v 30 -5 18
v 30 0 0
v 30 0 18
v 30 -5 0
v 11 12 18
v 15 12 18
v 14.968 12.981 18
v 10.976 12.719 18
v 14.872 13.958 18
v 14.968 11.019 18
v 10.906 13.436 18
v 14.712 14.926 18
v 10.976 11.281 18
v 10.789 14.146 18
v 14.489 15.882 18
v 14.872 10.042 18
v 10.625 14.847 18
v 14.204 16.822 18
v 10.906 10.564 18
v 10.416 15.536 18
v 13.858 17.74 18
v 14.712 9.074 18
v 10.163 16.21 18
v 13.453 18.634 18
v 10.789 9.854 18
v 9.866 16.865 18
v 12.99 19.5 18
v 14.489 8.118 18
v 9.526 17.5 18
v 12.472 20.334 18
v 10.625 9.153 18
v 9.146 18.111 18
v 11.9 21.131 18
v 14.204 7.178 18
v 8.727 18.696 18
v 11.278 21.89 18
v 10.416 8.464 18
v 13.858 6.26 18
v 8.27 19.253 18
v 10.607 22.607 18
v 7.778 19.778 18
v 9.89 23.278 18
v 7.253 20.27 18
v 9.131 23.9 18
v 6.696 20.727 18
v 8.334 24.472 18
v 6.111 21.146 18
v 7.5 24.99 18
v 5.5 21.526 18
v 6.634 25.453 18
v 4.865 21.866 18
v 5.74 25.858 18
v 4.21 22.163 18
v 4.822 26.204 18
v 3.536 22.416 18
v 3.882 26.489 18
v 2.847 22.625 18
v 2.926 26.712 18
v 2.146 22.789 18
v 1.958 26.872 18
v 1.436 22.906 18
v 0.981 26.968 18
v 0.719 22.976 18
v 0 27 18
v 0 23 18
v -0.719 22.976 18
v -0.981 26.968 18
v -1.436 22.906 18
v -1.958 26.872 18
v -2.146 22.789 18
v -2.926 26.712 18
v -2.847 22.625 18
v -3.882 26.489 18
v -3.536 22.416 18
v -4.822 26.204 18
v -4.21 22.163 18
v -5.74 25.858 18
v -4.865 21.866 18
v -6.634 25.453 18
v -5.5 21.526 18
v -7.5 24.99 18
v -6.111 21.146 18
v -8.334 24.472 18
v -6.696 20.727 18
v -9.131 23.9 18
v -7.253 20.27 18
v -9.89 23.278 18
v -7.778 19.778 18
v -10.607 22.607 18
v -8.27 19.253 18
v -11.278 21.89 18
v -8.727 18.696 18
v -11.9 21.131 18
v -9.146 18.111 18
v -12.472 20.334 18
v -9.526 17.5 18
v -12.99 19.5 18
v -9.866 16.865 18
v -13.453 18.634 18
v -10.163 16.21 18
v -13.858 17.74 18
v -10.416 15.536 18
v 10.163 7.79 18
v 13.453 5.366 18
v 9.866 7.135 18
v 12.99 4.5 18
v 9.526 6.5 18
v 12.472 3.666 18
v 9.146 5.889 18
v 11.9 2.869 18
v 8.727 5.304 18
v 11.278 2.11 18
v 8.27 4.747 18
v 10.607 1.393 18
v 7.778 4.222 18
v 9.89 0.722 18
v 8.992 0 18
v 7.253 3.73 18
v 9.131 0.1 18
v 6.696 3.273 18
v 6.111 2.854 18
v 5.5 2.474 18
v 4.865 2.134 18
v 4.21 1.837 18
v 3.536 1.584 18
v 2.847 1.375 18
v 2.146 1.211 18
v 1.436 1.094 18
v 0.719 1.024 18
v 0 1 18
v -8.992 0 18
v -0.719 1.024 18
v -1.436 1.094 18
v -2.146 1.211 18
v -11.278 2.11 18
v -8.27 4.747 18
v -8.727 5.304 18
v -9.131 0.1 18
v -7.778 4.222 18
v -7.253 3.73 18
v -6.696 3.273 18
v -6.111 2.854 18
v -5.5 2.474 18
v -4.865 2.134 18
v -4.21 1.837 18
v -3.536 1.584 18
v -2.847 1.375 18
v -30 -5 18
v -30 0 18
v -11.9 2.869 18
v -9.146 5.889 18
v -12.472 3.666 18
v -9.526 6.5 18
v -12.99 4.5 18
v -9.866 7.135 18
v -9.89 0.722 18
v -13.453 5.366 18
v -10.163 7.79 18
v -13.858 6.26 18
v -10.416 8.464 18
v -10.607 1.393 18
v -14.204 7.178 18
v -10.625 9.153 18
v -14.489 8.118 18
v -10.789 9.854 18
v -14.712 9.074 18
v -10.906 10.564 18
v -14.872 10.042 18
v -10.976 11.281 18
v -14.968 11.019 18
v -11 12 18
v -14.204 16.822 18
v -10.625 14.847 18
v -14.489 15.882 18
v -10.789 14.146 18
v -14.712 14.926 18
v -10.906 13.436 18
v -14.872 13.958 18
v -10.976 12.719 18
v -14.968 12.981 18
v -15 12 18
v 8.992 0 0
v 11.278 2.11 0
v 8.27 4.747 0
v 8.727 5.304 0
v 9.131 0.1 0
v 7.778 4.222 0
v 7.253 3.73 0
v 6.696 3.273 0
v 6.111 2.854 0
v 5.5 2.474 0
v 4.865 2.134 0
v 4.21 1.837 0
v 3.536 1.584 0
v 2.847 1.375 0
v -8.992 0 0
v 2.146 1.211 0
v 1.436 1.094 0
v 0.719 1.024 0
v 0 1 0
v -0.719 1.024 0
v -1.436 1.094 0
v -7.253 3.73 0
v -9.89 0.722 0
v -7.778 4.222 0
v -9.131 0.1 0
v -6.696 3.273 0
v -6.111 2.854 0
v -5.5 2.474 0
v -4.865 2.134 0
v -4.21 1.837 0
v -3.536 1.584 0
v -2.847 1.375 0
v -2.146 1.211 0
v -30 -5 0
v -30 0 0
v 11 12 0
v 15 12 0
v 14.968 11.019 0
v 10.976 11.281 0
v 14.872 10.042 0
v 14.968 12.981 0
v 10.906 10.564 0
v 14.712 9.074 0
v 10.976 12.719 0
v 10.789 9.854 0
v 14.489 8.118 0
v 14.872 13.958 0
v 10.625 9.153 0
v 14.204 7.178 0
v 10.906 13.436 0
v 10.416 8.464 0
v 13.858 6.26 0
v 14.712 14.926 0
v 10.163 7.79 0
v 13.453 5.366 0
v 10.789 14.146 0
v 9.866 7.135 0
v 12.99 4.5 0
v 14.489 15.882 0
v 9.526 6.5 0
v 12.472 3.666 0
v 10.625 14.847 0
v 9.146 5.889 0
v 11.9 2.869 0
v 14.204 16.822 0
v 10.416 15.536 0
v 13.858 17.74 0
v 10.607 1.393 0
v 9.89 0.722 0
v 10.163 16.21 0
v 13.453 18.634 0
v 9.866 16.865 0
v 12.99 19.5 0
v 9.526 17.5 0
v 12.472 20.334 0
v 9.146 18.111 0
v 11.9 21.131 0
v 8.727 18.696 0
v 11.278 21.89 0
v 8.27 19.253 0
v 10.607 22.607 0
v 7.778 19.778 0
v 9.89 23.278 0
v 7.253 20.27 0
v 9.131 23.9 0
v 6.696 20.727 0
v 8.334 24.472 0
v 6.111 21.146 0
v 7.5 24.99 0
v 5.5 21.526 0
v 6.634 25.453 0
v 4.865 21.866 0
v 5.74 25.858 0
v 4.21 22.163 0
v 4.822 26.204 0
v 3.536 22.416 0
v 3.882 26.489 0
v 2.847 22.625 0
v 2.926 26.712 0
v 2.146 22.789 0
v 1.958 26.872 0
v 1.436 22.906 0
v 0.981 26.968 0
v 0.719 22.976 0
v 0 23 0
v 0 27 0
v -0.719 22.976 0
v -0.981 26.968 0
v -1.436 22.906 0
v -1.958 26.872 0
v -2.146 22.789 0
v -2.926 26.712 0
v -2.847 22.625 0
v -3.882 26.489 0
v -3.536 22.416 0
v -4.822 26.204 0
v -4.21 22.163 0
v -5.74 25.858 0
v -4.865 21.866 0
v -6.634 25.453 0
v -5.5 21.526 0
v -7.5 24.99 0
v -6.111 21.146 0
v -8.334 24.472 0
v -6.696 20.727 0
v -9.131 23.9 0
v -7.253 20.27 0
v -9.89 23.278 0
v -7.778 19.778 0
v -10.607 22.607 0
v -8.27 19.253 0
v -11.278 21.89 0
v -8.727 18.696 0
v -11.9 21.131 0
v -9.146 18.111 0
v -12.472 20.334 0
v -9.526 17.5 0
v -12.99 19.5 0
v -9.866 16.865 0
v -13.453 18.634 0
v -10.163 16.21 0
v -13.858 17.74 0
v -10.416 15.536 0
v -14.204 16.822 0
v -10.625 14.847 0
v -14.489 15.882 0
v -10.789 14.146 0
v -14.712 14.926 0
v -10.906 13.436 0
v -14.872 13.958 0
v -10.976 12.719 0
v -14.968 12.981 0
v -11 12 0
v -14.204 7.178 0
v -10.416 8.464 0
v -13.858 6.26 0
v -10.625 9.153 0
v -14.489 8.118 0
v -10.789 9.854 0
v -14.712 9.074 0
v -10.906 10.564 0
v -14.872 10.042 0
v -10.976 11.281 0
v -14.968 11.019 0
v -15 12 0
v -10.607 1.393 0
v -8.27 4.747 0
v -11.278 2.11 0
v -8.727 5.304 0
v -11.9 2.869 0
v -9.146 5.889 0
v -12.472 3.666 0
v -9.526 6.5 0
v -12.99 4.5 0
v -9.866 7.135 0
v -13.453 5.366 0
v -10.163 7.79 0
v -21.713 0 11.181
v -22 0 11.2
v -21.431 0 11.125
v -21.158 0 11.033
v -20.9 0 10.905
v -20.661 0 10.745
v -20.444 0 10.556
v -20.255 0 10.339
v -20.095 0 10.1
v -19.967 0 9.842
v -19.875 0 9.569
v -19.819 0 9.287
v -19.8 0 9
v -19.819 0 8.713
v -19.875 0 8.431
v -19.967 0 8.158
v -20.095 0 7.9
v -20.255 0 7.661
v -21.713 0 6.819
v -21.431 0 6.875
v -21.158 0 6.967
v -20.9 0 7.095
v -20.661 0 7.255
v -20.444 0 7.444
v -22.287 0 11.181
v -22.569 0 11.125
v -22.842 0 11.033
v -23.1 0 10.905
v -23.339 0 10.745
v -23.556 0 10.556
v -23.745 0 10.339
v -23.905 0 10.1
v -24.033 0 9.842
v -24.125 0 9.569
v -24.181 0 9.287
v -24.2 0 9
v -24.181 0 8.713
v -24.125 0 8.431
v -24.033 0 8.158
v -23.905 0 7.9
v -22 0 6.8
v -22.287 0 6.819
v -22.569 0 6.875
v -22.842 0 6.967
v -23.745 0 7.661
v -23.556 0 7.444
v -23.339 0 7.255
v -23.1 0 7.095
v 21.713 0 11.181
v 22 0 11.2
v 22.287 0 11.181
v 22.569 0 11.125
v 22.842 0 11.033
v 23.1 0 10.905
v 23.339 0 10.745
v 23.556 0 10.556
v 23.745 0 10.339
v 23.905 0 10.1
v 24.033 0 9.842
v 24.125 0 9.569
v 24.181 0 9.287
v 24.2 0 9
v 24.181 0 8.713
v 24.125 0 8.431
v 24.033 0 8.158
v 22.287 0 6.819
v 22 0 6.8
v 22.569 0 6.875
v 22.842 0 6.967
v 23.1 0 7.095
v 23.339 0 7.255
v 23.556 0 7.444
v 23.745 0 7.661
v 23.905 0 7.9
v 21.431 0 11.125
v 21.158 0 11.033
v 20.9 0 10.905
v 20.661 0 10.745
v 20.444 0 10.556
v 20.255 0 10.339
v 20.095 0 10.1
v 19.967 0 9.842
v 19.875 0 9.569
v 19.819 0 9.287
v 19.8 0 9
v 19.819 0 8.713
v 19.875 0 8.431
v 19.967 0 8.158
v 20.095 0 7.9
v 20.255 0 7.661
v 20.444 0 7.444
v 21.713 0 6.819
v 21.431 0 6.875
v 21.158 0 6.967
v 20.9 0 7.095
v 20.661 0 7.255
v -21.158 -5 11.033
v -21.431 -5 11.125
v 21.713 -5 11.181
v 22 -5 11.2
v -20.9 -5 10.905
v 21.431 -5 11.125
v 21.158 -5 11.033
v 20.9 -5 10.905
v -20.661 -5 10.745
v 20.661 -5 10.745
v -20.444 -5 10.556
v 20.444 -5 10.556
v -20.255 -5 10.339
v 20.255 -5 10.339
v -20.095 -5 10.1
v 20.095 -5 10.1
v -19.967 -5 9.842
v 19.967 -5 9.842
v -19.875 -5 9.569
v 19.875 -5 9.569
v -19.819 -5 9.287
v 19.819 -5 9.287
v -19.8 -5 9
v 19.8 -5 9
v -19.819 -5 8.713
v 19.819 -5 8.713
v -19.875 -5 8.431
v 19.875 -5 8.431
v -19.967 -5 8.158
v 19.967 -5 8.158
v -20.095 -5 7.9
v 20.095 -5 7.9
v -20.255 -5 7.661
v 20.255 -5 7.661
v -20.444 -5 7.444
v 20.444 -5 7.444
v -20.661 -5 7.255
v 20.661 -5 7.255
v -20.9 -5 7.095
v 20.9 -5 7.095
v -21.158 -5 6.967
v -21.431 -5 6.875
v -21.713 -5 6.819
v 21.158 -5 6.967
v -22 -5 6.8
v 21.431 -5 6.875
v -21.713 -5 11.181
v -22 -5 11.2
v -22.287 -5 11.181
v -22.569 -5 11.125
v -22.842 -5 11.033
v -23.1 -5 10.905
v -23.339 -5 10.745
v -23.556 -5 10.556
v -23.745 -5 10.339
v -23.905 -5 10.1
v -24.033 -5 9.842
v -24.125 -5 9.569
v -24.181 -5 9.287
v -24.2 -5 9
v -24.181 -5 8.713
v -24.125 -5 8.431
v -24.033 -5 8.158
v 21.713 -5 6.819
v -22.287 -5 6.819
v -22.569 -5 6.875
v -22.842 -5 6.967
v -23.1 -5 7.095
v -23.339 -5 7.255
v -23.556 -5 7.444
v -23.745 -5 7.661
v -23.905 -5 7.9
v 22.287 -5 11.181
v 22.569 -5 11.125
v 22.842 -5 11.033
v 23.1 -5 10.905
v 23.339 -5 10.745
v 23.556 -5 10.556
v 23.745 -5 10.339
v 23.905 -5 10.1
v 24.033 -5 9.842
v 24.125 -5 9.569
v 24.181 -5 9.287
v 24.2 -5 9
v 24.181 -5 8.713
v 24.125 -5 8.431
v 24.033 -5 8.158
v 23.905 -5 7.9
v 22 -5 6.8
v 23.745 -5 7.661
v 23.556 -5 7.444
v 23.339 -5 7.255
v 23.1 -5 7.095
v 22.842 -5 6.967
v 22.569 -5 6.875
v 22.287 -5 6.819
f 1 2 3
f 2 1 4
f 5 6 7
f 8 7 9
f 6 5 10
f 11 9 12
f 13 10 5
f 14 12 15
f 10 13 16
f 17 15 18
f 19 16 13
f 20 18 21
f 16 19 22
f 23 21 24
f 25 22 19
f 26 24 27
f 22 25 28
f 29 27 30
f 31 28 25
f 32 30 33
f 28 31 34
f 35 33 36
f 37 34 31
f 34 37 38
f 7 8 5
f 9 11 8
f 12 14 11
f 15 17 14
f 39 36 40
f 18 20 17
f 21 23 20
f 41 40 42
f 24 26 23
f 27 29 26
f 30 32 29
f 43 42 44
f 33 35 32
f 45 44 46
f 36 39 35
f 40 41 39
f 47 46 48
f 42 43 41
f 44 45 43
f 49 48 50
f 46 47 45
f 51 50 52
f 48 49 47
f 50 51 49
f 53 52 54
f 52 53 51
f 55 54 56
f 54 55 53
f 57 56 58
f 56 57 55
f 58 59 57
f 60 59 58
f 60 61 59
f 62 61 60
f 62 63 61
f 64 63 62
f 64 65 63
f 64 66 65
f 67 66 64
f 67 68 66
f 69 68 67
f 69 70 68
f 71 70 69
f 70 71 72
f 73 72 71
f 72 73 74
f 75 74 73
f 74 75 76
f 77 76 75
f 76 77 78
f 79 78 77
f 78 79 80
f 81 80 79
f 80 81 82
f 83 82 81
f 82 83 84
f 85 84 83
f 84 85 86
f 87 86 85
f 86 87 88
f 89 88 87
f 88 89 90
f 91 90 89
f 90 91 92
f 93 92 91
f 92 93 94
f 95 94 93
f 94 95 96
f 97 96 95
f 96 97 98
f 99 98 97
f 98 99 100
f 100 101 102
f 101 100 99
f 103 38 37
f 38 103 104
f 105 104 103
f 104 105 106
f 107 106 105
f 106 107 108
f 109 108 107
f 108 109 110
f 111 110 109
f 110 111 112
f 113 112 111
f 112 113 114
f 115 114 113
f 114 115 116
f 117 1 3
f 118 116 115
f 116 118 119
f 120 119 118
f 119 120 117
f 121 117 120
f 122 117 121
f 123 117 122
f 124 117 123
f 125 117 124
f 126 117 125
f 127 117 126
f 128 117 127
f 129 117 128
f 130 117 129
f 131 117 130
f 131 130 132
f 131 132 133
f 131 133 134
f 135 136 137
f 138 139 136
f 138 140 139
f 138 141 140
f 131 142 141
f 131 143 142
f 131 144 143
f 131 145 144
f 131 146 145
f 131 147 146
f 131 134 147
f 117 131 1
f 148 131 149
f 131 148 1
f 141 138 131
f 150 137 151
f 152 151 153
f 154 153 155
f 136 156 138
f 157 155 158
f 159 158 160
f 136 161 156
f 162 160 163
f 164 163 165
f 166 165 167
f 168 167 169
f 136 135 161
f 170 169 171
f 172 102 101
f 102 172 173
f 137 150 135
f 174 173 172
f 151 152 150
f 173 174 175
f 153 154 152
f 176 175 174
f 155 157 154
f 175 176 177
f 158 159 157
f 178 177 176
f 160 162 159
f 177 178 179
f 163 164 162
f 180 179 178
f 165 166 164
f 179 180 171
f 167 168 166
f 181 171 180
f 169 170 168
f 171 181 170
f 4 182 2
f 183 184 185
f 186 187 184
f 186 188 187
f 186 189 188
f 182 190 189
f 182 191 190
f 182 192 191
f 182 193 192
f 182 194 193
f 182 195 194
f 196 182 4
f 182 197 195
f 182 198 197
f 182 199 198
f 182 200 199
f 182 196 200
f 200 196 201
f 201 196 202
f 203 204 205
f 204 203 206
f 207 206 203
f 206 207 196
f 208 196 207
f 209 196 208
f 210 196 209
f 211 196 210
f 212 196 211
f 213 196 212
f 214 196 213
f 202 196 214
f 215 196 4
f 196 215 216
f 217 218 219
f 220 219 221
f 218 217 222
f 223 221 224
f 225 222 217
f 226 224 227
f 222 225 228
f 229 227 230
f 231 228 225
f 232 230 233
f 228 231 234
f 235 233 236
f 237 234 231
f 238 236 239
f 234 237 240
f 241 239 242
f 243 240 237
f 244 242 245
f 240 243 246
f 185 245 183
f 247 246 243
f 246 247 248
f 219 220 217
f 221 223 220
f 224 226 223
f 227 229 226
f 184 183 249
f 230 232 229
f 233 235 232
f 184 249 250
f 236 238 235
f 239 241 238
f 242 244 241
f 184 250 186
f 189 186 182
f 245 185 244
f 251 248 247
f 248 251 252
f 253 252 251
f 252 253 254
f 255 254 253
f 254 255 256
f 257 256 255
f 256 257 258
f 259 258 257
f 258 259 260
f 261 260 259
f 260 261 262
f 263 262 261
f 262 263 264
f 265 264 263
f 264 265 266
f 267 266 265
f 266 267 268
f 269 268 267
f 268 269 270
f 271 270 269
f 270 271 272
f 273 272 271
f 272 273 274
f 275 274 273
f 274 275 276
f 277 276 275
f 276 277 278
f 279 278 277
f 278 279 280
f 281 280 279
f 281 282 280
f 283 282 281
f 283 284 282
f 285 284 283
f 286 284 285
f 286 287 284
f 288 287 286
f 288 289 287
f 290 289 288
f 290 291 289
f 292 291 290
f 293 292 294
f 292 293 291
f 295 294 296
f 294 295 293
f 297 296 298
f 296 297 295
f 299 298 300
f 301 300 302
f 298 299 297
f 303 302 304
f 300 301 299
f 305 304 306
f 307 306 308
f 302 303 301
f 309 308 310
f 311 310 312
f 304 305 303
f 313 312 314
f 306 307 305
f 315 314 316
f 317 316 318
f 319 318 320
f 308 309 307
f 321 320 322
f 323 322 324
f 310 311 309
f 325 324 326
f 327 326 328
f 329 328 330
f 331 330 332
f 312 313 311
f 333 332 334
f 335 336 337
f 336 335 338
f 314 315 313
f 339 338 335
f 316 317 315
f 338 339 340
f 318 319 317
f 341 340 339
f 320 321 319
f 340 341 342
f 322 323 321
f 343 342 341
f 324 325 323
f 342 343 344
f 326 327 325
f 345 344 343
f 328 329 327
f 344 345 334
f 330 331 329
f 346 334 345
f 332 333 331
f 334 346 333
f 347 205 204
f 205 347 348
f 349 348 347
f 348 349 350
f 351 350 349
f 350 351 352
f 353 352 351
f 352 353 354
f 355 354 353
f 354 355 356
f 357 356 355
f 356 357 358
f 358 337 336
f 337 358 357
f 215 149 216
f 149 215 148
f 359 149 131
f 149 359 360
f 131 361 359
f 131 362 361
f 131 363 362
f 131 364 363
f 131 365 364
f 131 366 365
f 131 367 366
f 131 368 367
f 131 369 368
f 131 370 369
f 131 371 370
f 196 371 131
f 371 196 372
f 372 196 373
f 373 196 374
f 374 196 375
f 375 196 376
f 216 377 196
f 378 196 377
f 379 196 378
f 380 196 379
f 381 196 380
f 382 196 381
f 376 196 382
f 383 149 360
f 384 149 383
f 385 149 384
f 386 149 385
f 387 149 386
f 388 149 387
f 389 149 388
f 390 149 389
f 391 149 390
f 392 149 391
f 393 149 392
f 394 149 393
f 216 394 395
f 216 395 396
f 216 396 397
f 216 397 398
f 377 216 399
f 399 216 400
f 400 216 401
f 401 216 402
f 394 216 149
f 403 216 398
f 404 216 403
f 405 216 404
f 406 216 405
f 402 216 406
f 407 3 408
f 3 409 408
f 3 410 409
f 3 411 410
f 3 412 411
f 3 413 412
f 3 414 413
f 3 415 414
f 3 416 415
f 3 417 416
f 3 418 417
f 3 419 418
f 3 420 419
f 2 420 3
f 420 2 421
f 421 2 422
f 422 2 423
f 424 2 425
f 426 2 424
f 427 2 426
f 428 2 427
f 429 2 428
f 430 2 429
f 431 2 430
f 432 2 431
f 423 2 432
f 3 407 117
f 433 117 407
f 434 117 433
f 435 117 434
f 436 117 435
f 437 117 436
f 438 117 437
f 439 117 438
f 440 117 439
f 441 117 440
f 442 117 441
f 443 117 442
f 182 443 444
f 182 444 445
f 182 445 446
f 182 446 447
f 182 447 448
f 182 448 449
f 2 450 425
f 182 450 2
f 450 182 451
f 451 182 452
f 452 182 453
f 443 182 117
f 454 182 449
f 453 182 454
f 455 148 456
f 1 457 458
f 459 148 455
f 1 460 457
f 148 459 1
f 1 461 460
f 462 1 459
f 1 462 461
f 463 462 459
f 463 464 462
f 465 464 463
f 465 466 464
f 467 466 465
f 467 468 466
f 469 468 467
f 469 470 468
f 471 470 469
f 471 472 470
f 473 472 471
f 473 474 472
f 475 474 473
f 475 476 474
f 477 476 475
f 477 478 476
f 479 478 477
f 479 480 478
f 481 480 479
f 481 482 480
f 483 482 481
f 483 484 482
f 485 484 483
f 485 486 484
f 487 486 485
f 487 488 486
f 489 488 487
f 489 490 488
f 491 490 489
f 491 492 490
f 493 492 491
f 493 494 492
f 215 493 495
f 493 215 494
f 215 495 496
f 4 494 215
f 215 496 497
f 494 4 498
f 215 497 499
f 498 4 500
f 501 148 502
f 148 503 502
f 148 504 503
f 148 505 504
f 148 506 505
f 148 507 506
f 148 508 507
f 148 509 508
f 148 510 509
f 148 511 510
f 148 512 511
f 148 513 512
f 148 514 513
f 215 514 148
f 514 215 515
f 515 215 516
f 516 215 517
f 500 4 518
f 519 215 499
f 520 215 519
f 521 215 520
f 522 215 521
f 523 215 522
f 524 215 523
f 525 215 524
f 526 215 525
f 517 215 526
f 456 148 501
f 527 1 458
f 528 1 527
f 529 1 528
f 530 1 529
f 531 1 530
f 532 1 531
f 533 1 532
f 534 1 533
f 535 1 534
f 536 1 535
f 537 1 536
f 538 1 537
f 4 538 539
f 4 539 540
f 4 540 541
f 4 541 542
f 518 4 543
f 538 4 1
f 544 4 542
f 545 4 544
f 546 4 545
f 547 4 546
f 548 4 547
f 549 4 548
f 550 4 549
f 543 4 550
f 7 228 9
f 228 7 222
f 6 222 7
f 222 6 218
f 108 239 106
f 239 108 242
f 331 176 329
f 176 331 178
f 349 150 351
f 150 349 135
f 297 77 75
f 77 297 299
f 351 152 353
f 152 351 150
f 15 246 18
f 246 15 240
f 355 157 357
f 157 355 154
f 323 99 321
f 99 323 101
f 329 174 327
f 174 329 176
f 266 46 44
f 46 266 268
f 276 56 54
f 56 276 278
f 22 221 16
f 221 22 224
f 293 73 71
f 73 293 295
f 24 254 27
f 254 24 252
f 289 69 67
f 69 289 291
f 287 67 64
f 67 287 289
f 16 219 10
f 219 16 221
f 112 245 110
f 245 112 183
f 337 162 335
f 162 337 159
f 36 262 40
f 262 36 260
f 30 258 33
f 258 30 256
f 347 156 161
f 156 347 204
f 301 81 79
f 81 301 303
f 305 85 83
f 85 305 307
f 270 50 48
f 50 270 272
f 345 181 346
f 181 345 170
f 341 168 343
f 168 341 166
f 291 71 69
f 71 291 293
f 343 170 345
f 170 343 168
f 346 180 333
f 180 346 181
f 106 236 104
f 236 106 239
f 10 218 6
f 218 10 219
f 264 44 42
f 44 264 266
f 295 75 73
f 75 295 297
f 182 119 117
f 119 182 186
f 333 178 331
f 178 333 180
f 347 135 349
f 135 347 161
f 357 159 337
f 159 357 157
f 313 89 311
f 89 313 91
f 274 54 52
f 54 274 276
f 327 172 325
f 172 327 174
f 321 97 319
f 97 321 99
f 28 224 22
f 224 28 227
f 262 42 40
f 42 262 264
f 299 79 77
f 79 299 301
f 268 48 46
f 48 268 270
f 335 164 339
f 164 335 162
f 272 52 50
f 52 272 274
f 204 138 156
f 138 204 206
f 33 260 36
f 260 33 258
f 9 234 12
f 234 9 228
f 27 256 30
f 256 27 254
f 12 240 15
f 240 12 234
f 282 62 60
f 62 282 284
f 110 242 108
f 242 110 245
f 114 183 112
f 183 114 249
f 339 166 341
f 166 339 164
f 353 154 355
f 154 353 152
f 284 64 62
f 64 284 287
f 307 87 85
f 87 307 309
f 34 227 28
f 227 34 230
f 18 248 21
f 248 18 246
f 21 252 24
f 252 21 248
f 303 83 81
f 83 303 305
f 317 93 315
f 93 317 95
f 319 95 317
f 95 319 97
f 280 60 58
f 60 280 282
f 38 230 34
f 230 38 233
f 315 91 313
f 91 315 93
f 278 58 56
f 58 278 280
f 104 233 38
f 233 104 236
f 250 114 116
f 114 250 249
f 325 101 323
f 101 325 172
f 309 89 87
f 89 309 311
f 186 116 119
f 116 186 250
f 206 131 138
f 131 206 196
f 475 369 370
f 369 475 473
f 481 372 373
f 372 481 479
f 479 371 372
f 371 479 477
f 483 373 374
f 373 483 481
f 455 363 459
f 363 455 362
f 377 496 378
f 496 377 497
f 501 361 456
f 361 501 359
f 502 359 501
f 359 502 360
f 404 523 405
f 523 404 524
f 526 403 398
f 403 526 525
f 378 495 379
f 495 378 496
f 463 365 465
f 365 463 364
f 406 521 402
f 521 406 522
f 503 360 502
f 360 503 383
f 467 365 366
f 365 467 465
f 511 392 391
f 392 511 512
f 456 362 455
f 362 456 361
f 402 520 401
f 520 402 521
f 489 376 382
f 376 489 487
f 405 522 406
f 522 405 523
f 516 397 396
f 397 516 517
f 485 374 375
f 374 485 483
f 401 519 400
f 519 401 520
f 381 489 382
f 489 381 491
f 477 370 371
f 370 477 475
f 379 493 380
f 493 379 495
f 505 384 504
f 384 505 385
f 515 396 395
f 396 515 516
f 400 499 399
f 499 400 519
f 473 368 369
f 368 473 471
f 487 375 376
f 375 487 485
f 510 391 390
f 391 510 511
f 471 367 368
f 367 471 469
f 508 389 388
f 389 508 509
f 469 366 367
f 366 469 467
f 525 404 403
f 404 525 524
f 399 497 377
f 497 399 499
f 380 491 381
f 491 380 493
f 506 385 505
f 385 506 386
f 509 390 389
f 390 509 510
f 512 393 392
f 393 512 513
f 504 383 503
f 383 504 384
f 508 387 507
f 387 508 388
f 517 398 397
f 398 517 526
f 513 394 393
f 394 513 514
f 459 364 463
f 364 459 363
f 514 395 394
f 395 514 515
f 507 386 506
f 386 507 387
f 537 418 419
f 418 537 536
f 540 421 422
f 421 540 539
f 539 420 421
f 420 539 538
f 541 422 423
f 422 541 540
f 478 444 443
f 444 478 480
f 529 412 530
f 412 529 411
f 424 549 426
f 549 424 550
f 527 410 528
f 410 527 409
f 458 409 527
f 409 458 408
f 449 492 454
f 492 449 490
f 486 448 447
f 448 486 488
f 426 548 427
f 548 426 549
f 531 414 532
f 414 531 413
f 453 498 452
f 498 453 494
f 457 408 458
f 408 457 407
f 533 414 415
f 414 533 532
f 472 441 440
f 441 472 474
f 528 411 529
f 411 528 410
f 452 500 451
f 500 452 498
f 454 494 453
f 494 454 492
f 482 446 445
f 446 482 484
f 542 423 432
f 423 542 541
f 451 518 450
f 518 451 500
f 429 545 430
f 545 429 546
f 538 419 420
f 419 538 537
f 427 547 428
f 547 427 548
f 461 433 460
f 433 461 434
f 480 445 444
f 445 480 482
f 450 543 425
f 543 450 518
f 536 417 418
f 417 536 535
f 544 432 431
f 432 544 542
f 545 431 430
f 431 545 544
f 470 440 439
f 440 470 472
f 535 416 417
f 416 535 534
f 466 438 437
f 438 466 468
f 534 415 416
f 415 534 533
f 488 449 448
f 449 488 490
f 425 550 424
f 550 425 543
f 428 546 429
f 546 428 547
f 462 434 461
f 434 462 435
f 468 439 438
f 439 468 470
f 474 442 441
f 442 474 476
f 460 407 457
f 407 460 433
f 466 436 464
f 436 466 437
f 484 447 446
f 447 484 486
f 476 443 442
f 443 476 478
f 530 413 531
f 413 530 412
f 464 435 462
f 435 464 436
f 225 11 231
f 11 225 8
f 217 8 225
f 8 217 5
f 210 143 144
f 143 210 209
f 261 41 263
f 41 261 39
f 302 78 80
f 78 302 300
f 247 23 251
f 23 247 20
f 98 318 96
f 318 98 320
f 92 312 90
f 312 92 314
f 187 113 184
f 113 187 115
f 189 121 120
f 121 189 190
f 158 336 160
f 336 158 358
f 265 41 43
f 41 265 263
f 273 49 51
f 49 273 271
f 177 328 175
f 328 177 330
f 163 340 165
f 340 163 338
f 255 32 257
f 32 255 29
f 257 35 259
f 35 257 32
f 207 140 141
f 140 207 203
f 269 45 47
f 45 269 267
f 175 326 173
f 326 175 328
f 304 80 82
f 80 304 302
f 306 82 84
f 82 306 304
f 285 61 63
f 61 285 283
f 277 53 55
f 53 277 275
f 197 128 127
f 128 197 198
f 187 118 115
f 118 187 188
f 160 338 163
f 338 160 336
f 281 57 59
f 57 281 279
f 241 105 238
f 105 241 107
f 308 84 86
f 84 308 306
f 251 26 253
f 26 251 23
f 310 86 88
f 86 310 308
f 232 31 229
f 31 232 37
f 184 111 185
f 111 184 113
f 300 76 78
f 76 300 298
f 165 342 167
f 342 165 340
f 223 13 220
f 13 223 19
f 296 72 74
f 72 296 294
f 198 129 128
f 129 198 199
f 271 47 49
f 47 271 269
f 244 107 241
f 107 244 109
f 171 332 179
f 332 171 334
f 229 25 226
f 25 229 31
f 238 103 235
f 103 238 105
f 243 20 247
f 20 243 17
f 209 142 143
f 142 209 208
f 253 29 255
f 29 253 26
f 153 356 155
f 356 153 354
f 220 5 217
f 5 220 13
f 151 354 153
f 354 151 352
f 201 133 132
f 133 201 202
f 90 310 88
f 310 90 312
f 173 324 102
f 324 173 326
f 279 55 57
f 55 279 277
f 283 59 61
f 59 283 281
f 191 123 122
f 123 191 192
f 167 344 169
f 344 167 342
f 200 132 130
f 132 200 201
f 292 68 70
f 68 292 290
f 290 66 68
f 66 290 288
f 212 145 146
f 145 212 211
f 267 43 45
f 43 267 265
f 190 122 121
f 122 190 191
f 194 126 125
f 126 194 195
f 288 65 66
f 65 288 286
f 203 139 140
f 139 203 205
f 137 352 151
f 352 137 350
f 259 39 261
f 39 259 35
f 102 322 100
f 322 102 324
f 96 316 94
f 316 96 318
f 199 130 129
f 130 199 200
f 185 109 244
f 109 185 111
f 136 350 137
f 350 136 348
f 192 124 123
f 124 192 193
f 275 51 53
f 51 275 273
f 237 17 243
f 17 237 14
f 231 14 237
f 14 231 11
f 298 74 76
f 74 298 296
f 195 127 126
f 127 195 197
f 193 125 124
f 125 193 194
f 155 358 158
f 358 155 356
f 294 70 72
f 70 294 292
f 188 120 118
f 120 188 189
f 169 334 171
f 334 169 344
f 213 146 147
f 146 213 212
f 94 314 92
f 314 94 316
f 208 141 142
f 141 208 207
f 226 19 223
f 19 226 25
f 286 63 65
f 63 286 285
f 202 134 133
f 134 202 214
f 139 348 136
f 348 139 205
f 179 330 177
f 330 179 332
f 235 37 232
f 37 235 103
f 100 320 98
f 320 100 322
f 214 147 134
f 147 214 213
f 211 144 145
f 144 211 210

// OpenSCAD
// pipe-bracket: wall bracket for a 22mm pipe with two M4 screw holes
pipe_d      = 22;
wall        = 4;
overlap     = 3;   // collar sinks into the back plate so the union is solid
depth       = 18;
plate_w     = 60;
plate_t     = 5;
screw_d     = 4.4;
screw_pitch = 44;
eps         = 0.01;

module bracket() {
    difference() {
        union() {
            // back plate
            translate([-plate_w/2, -plate_t, 0]) cube([plate_w, plate_t, depth]);
            // collar
            translate([0, pipe_d/2 + wall - overlap, 0])
                cylinder(h = depth, d = pipe_d + 2*wall, $fn = 96);
        }
        // pipe bore, opened top and bottom so no coincident faces remain
        translate([0, pipe_d/2 + wall - overlap, -eps])
            cylinder(h = depth + 2*eps, d = pipe_d, $fn = 96);
        // screw holes through the back plate
        for (x = [-screw_pitch/2, screw_pitch/2])
            translate([x, -plate_t - eps, depth/2])
                rotate([-90, 0, 0])
                    cylinder(h = plate_t + 2*eps, d = screw_d, $fn = 48);
    }
}
bracket();
